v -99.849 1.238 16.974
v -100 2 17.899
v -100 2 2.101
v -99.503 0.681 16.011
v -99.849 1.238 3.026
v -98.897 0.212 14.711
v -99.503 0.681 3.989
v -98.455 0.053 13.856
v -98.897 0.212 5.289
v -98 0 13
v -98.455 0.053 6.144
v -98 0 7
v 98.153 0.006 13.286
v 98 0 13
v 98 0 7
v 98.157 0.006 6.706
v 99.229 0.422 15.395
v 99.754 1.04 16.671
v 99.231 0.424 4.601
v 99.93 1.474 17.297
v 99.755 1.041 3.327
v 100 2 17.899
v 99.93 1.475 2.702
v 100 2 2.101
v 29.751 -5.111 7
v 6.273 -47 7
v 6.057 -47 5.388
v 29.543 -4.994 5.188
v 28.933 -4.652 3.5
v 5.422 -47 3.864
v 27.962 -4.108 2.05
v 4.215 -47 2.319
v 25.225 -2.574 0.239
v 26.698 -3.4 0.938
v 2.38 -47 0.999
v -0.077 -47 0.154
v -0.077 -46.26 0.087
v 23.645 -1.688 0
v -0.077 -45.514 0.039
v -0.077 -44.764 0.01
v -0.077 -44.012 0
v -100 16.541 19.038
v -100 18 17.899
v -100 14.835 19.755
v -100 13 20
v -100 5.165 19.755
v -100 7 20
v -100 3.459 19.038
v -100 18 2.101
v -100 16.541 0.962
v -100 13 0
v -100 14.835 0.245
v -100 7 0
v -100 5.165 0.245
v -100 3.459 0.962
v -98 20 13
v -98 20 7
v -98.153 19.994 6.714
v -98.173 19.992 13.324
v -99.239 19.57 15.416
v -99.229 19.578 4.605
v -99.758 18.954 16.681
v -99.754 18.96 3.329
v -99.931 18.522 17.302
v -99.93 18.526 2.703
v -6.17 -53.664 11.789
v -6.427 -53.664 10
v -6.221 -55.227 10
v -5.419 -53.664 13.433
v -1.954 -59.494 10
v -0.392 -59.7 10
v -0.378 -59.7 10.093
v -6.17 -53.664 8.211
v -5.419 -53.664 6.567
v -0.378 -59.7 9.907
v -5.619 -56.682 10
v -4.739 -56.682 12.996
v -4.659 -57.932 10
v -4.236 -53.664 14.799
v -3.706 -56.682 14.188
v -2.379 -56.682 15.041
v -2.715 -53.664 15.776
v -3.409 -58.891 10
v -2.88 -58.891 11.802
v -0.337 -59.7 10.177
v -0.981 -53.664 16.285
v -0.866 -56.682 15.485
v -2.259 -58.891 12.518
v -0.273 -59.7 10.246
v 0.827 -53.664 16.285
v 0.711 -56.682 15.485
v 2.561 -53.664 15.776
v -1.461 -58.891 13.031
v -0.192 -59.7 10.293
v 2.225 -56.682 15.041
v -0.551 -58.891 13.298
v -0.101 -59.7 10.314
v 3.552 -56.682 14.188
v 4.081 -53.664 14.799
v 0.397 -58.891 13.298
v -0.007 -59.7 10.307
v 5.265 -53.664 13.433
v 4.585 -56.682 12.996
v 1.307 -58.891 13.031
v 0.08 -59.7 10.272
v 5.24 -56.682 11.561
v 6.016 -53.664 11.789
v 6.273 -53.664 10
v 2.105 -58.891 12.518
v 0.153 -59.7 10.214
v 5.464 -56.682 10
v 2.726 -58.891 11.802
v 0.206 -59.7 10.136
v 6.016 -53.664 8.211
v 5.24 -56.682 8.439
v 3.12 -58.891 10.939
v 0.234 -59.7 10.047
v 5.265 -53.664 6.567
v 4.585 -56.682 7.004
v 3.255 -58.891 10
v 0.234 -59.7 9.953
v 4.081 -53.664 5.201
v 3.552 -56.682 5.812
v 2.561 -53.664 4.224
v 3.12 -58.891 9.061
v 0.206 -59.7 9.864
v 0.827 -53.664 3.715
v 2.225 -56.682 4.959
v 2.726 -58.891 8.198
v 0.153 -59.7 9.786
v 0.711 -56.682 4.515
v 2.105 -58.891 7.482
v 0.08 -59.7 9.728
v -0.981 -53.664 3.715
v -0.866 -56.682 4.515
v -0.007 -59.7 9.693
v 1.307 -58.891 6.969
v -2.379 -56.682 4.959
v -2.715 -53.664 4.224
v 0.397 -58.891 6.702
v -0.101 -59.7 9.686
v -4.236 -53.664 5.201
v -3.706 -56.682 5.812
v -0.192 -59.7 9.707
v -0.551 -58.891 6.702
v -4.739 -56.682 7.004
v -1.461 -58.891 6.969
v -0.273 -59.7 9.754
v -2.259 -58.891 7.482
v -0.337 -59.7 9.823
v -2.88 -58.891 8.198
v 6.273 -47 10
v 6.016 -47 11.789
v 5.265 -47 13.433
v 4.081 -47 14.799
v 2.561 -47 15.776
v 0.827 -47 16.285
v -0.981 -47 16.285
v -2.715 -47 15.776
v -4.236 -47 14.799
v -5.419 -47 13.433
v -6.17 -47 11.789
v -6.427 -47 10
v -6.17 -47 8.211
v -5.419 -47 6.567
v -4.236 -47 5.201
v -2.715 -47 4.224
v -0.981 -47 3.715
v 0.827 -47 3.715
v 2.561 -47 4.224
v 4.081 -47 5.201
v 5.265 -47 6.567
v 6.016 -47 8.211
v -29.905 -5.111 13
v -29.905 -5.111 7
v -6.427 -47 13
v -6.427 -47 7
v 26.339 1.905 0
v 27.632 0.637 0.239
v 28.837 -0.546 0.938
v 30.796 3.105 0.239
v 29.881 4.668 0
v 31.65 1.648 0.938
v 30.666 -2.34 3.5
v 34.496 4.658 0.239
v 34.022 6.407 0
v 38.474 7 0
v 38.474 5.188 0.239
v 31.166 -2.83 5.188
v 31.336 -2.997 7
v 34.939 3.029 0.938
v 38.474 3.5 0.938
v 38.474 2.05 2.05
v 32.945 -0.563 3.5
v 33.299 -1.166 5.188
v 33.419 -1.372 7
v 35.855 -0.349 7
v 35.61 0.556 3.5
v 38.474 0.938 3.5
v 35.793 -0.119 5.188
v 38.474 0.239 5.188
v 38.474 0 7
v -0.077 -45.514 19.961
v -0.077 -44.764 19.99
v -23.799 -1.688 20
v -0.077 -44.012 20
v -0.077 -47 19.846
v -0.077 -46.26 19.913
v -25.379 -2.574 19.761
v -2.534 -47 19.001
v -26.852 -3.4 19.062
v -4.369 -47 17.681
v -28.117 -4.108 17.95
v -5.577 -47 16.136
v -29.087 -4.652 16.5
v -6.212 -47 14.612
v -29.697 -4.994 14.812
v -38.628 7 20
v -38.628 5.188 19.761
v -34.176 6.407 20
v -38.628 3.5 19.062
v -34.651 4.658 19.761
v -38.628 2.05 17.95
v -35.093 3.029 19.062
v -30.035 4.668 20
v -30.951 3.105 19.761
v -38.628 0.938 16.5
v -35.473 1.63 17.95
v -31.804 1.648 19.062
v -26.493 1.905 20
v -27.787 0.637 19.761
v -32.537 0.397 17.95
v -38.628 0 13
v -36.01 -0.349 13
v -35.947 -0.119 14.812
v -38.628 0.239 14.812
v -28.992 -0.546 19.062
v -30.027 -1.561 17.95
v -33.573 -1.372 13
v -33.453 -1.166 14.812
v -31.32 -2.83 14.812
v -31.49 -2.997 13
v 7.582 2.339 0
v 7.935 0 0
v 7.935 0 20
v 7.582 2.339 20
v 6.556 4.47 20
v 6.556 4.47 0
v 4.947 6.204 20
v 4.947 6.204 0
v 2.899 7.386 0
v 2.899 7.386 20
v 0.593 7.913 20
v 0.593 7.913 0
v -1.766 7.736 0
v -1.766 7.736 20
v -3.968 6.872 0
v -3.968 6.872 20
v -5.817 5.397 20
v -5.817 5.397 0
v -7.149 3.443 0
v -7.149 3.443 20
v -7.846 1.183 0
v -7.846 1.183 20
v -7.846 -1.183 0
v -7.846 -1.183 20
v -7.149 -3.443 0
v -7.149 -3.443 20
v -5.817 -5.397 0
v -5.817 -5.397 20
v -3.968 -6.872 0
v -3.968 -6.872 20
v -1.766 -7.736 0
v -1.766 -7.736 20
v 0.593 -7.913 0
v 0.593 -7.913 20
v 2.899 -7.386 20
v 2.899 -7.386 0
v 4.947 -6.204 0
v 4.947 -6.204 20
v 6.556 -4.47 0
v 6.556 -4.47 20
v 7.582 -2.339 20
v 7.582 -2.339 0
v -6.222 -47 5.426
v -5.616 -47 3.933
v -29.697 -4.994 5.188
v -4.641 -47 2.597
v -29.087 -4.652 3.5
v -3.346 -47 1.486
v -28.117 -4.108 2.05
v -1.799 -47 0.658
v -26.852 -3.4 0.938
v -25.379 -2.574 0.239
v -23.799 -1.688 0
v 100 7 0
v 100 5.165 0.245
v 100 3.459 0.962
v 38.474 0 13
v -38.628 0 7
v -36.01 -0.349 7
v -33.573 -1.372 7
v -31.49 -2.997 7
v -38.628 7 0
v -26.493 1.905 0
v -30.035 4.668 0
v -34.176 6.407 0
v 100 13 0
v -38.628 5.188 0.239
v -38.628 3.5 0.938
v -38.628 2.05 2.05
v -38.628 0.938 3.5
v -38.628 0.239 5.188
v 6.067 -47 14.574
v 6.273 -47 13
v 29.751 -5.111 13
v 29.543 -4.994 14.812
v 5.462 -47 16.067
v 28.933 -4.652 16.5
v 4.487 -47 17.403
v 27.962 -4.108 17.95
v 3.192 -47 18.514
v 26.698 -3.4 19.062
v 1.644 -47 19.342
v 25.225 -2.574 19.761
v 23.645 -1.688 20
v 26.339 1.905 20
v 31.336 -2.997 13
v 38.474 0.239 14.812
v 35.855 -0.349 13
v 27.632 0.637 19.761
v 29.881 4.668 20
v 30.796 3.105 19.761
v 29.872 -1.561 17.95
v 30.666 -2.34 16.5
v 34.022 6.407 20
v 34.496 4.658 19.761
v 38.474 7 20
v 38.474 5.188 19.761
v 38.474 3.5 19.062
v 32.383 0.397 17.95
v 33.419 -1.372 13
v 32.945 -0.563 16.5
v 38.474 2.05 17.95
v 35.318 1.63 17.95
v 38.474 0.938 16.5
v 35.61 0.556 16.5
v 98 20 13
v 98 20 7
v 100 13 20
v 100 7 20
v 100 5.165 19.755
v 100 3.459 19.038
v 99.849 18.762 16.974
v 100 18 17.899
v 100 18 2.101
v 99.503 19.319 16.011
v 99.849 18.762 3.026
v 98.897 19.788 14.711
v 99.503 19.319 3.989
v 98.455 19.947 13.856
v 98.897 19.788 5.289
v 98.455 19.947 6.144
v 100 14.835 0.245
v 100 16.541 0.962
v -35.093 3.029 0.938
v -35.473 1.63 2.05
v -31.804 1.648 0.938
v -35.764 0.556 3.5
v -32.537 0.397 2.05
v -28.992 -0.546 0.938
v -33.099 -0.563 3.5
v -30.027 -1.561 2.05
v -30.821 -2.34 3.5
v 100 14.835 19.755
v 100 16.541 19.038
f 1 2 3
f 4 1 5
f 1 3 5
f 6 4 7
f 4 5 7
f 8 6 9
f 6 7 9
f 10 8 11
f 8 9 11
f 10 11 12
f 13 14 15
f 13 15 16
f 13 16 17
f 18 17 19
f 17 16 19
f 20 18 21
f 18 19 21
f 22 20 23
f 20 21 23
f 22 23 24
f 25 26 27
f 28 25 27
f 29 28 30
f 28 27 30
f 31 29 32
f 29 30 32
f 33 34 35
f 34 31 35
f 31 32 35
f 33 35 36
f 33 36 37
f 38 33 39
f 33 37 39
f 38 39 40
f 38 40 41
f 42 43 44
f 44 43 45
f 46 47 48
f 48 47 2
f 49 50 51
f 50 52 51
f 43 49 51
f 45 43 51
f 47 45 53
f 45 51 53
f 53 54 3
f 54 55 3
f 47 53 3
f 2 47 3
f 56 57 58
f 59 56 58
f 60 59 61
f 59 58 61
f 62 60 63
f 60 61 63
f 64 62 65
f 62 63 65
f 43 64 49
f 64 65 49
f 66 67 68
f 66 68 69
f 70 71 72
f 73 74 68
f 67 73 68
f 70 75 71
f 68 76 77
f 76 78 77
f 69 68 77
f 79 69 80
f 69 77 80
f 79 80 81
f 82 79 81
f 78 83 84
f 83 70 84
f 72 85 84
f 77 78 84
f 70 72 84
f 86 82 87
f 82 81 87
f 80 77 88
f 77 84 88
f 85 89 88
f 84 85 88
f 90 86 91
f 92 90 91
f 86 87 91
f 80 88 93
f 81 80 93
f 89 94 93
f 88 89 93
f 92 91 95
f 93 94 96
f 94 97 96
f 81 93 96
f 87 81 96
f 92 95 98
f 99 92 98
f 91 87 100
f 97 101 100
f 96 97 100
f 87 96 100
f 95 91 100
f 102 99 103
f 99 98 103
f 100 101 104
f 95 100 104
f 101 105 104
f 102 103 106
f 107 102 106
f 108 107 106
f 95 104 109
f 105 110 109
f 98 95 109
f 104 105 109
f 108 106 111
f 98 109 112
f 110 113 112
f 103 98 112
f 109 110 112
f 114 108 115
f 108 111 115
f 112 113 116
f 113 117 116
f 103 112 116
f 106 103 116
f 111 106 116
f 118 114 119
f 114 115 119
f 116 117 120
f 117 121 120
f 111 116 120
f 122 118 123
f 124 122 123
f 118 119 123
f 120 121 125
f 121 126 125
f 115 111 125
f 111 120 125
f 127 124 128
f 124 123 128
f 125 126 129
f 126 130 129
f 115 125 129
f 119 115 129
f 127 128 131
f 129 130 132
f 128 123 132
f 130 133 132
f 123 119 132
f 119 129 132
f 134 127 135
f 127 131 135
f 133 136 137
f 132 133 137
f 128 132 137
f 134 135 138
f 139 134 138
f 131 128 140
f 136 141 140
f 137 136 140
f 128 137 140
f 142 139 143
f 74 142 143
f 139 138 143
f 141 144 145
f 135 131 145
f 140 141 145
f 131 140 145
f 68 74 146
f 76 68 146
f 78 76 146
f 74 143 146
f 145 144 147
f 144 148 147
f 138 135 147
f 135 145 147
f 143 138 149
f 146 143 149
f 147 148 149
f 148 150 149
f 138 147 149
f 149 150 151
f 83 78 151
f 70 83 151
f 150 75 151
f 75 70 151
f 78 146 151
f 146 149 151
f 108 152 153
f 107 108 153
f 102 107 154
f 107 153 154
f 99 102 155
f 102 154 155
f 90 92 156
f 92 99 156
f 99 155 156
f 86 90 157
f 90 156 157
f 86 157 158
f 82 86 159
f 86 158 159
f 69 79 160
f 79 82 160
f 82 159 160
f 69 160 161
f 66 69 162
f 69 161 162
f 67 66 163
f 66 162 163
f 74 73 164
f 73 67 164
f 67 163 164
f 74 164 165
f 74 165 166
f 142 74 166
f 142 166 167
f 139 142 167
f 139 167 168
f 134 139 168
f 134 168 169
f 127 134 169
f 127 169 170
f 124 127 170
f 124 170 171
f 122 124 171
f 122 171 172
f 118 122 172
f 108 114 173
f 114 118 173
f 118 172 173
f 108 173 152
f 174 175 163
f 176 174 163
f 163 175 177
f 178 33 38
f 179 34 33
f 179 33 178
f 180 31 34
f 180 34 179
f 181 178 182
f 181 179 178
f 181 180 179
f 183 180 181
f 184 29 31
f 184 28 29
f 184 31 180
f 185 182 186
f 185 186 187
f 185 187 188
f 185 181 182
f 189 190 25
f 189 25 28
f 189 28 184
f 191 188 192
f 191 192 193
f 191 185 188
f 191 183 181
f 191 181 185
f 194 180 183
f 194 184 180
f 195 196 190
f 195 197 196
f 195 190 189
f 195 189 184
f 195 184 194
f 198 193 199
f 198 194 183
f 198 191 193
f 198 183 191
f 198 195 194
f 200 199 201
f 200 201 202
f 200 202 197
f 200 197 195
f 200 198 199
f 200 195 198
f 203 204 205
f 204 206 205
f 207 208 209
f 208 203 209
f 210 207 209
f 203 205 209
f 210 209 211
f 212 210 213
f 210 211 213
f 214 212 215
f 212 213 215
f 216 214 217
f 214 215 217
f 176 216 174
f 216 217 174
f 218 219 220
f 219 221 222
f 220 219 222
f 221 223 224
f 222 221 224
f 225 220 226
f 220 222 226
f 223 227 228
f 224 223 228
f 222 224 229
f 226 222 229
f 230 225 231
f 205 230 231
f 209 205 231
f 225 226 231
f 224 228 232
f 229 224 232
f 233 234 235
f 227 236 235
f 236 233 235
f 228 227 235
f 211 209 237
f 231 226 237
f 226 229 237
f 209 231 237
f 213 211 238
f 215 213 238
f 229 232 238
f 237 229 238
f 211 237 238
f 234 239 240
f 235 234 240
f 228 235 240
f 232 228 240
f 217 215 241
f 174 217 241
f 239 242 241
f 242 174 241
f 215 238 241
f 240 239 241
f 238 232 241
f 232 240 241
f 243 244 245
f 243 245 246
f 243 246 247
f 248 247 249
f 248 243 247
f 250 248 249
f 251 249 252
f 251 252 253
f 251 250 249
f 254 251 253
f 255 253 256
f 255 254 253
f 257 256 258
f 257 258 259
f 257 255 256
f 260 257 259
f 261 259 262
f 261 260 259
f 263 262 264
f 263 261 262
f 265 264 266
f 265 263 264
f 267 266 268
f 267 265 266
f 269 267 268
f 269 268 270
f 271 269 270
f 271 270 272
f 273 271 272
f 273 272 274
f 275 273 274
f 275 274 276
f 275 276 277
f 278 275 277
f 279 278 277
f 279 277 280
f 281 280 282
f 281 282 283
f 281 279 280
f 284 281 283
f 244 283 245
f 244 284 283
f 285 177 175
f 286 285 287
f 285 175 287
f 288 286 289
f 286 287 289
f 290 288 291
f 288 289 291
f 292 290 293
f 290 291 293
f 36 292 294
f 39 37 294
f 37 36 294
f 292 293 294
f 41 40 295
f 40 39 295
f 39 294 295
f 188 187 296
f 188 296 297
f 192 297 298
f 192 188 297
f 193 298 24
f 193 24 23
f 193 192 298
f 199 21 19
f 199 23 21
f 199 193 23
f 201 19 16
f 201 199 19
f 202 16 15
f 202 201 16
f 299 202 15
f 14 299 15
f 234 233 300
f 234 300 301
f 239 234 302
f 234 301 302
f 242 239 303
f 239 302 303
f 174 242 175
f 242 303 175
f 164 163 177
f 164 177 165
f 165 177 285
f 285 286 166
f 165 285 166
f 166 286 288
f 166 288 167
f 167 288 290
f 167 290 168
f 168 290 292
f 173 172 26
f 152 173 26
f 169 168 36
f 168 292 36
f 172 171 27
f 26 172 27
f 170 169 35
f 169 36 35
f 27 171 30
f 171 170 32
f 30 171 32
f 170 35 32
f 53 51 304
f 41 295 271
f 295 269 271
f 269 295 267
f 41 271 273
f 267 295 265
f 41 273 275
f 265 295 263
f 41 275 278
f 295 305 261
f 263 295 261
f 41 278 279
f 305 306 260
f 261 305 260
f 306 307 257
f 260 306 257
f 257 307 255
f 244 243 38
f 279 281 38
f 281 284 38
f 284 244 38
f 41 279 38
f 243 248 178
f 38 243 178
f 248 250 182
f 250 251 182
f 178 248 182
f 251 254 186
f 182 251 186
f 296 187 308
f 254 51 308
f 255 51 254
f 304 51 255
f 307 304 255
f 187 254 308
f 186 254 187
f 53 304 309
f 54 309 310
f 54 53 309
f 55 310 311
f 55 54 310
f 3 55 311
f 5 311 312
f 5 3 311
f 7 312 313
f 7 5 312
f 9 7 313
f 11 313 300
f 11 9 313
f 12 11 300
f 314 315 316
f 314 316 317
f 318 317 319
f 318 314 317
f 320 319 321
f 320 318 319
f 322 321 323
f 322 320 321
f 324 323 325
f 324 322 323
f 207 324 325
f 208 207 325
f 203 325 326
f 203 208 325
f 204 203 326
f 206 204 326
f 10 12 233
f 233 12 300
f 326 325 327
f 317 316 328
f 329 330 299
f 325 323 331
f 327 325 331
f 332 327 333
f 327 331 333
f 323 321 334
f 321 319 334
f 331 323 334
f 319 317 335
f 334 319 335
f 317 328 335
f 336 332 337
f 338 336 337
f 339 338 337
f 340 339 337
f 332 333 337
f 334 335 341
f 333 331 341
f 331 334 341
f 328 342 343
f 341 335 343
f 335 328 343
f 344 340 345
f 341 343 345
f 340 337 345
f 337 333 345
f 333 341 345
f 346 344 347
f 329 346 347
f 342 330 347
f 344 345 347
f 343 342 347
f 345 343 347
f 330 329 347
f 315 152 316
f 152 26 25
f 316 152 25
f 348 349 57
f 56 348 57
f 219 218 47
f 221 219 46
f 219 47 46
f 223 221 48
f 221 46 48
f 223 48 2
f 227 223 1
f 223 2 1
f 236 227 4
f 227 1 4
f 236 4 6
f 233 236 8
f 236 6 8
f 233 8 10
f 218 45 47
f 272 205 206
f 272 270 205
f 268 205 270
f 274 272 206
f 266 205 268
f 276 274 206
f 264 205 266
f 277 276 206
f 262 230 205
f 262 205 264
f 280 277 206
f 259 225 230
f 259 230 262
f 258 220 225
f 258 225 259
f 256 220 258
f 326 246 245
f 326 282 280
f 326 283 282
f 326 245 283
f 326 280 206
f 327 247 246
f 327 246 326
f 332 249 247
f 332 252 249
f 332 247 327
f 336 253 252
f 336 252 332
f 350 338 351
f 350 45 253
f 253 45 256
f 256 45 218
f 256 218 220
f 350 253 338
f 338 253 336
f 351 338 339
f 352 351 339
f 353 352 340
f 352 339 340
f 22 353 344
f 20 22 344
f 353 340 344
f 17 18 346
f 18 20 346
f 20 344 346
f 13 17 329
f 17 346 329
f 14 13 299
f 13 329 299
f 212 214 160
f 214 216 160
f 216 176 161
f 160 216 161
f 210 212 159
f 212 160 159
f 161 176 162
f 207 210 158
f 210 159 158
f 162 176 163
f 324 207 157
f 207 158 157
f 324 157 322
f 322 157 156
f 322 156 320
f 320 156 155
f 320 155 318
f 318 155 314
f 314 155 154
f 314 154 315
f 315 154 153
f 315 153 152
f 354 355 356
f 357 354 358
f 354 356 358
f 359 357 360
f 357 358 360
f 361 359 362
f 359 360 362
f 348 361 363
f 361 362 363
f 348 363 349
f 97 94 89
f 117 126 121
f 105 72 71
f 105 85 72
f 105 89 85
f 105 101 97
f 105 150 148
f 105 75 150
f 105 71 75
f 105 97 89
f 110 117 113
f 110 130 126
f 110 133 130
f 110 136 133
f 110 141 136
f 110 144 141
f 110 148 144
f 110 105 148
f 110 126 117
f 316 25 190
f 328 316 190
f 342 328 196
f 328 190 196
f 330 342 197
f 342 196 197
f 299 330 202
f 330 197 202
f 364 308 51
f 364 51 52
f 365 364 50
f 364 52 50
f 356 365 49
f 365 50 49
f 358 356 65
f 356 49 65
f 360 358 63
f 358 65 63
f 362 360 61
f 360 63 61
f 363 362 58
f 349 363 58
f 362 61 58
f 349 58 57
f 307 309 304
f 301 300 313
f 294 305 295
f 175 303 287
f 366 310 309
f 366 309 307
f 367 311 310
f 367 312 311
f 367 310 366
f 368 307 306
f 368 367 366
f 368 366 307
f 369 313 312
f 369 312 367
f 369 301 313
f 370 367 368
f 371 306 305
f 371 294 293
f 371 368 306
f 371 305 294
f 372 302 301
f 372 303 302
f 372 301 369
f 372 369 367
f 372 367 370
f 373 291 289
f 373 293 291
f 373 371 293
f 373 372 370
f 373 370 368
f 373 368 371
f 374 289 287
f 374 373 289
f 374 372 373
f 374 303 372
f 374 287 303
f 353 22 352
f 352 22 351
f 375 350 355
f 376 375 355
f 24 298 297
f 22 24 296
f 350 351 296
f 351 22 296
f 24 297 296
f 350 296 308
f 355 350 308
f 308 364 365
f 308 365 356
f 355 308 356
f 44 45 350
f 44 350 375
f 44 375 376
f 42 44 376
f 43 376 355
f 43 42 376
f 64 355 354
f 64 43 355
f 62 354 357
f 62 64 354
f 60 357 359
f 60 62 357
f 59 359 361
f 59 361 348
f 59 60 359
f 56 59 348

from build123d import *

# Parameters (mm, degrees)
F0_R         = 7.935
F1_DEPTH     = 20
F2_DEPTH     = 12.7
F4_DEPTH     = 12.7
F6_T1_DEPTH  = 77.0257979591
F6_T3_DEPTH  = 76.8715237662
F6_T5_DEPTH  = 231
F6_T8_ANGLE  = 60.7302478015
F6_T12_DEPTH = 65.5200608313
F6_T17_DEPTH = 65.5200608313
F6_T20_ANGLE = 60.7302478015
F6_T22_ANGLE = 60.7302478015
F6_T26_DEPTH = 65.5200608313
F6_T31_DEPTH = 65.5200608313
F6_T34_ANGLE = 60.7302478015


# Not quite as in the source:
# - a fillet or chamfer that OpenCascade refuses, or shapes differently, is made with other operations: its cross-section is extruded or revolved along the edge and cut away or added


with BuildPart() as f1:
    # F0 (on Top) → F1 (new body)
    with BuildSketch(Plane.XY):
        with BuildLine():
            Line((98, 20), (-98, 20))
            ThreePointArc((-98, 20), (-99.4142135624, 19.4142135624), (-100, 18))
            Line((-100, 18), (-100, 2))
            ThreePointArc((-100, 2), (-99.4142135624, 0.5857864376), (-98, 0))
            Line((-98, 0), (-38.6284762338, 0))
            ThreePointArc((-38.6284762338, 0), (-33.5733896743, -1.3717846645), (-29.9052011587, -5.1107800249))
            Line((-29.9052011587, -5.1107800249), (-6.4271370964, -47))
            Line((-6.4271370964, -47), (-6.4271370964, -59.7))
            Line((-6.4271370964, -59.7), (6.2728629036, -59.7))
            Line((6.2728629036, -59.7), (6.2728629036, -47))
            Line((6.2728629036, -47), (29.7509269659, -5.1107800249))
            ThreePointArc((29.7509269659, -5.1107800249), (33.4191154814, -1.3717846645), (38.4742020409, 0))
            Line((38.4742020409, 0), (98, 0))
            ThreePointArc((98, 0), (99.4142135624, 0.5857864376), (100, 2))
            Line((100, 2), (100, 18))
            ThreePointArc((100, 18), (99.4142135624, 19.4142135624), (98, 20))
        make_face()
        Circle(F0_R, mode=Mode.SUBTRACT)
    extrude(amount=F1_DEPTH)

    # F2 (cut): a face of the model
    f2_faces = [f1.faces().sort_by_distance(p)[0] for p in [
        (-0.0771370964, -59.7, 10),
    ]]
    extrude(f2_faces, amount=-F2_DEPTH, mode=Mode.SUBTRACT)

    # F3 (on face) → F4 (join)
    with BuildSketch(Plane.XZ.offset(47)):
        with BuildLine():
            ThreePointArc((-6.4271370964, 10), (-0.0771370964, 3.65), (6.2728629036, 10))
            ThreePointArc((6.2728629036, 10), (-0.0771370964, 16.35), (-6.4271370964, 10))
        make_face()
    extrude(amount=F4_DEPTH)

    # F5: fillet of radius 6.0355339059 on 1 edges, made by hand

    # F5_s1 → F5_t2 (revolve, cut)
    with BuildSketch(Plane.XY.offset(10)):
        with BuildLine():
            ThreePointArc((-6.4271370964, -53.6644660941), (-4.6593701435, -57.932233047), (-0.3916031905, -59.7))
            Line((-0.3916031905, -59.7), (-6.4271370964, -59.7))
            Line((-6.4271370964, -59.7), (-6.4271370964, -53.6644660941))
        make_face()
    revolve(axis=Axis((-0.0771370964, -59.7, 10), (0, 1, 0)), mode=Mode.SUBTRACT)

    # F6: fillet of radius 7 on 14 edges, made by hand

    # F6_s2 → F6_t1 (cut)
    with BuildSketch(Plane.YZ.offset(38.4742020409)):
        with BuildLine():
            ThreePointArc((7, 0), (2.0502525317, 2.0502525317), (0, 7))
            Line((0, 7), (0, 0))
            Line((0, 0), (7, 0))
        make_face()
        with BuildLine():
            ThreePointArc((7, 20), (2.0502525317, 17.9497474683), (0, 13))
            Line((0, 13), (0, 20))
            Line((0, 20), (7, 20))
        make_face()
    extrude(amount=F6_T1_DEPTH, mode=Mode.SUBTRACT)

    # F6_s4 → F6_t3 (cut)
    with BuildSketch(Plane.YZ.offset(-115.5)):
        with BuildLine():
            ThreePointArc((7, 0), (2.0502525317, 2.0502525317), (0, 7))
            Line((0, 7), (0, 0))
            Line((0, 0), (7, 0))
        make_face()
        with BuildLine():
            ThreePointArc((7, 20), (2.0502525317, 17.9497474683), (0, 13))
            Line((0, 13), (0, 20))
            Line((0, 20), (7, 20))
        make_face()
    extrude(amount=F6_T3_DEPTH, mode=Mode.SUBTRACT)

    # F6_s6 → F6_t5 (cut)
    with BuildSketch(Plane.YZ.offset(-115.5)):
        with BuildLine():
            ThreePointArc((13, 0), (17.9497474683, 2.0502525317), (20, 7))
            Line((20, 7), (20, 0))
            Line((20, 0), (13, 0))
        make_face()
        with BuildLine():
            ThreePointArc((13, 20), (17.9497474683, 17.9497474683), (20, 13))
            Line((20, 13), (20, 20))
            Line((20, 20), (13, 20))
        make_face()
    extrude(amount=F6_T5_DEPTH, mode=Mode.SUBTRACT)

    # F6_s7 → F6_t8 (revolve, cut)
    with BuildSketch(Plane(origin=(4.9320537662, 8.7996985012, 0), x_dir=(0, 0, 1), z_dir=(-0.4889219975, -0.8723275075, 0))):
        with BuildLine():
            ThreePointArc((0, -21.4513247447), (2.0502525317, -26.401072213), (7, -28.4513247447))
            Line((7, -28.4513247447), (0, -28.4513247447))
            Line((0, -28.4513247447), (0, -21.4513247447))
        make_face()
    revolve(axis=Axis((38.4742020409, -10, 0), (0, 0, -1)), revolution_arc=F6_T8_ANGLE, mode=Mode.SUBTRACT)


with BuildPart() as f6_tool10:
    # F6_s11 → F6_t12 (new body)
    with BuildSketch(Plane(origin=(-27.1021452526, -48.3552528553, 0), x_dir=(0, 0, 1), z_dir=(0.4889219975, 0.8723275075, 0))):
        with BuildLine():
            ThreePointArc((7, 28.4513247447), (2.0502525317, 26.401072213), (0, 21.4513247447))
            Line((0, 21.4513247447), (0, 28.4513247447))
            Line((0, 28.4513247447), (7, 28.4513247447))
        make_face()
    extrude(amount=F6_T12_DEPTH)

    split(bisect_by=Plane.XZ.offset(47), keep=Keep.BOTTOM)


with BuildPart() as f1_1:
    add(f1.part)

    # F6_t9: cut F6_tool10
    add(f6_tool10.part, mode=Mode.SUBTRACT)


with BuildPart() as f6_tool15:
    # F6_s16 → F6_t17 (new body)
    with BuildSketch(Plane(origin=(-4.9689321973, 8.865496461, 0), x_dir=(0, 0, 1), z_dir=(0.4889219975, -0.8723275075, 0))):
        with BuildLine():
            ThreePointArc((7, 28.5859023668), (2.0502525317, 26.5356498351), (0, 21.5859023668))
            Line((0, 21.5859023668), (0, 28.5859023668))
            Line((0, 28.5859023668), (7, 28.5859023668))
        make_face()
    extrude(amount=F6_T17_DEPTH)

    split(bisect_by=Plane.XZ.offset(47), keep=Keep.BOTTOM)


with BuildPart() as f1_2:
    add(f1_1.part)

    # F6_t14: cut F6_tool15
    add(f6_tool15.part, mode=Mode.SUBTRACT)

    # F6_s19 → F6_t20 (revolve, cut)
    with BuildSketch(Plane.YZ.offset(-38.6284762338)):
        with BuildLine():
            ThreePointArc((7, 0), (2.0502525317, 2.0502525317), (0, 7))
            Line((0, 7), (0, 0))
            Line((0, 0), (7, 0))
        make_face()
    revolve(axis=Axis((-38.6284762338, -10, 0), (0, 0, -1)), revolution_arc=F6_T20_ANGLE, mode=Mode.SUBTRACT)

    # F6_s21 → F6_t22 (revolve, cut)
    with BuildSketch(Plane(origin=(4.9320537662, 8.7996985012, 0), x_dir=(0, 0, 1), z_dir=(-0.4889219975, -0.8723275075, 0))):
        with BuildLine():
            ThreePointArc((20, -21.4513247447), (17.9497474683, -26.401072213), (13, -28.4513247447))
            Line((13, -28.4513247447), (20, -28.4513247447))
            Line((20, -28.4513247447), (20, -21.4513247447))
        make_face()
    revolve(axis=Axis((38.4742020409, -10, 20), (0, 0, -1)), revolution_arc=F6_T22_ANGLE, mode=Mode.SUBTRACT)


with BuildPart() as f6_tool24:
    # F6_s25 → F6_t26 (new body)
    with BuildSketch(Plane(origin=(-27.1021452526, -48.3552528553, 0), x_dir=(0, 0, 1), z_dir=(0.4889219975, 0.8723275075, 0))):
        with BuildLine():
            ThreePointArc((13, 28.4513247447), (17.9497474683, 26.401072213), (20, 21.4513247447))
            Line((20, 21.4513247447), (20, 28.4513247447))
            Line((20, 28.4513247447), (13, 28.4513247447))
        make_face()
    extrude(amount=F6_T26_DEPTH)

    split(bisect_by=Plane.XZ.offset(47), keep=Keep.BOTTOM)


with BuildPart() as f1_3:
    add(f1_2.part)

    # F6_t23: cut F6_tool24
    add(f6_tool24.part, mode=Mode.SUBTRACT)


with BuildPart() as f6_tool29:
    # F6_s30 → F6_t31 (new body)
    with BuildSketch(Plane(origin=(-4.9689321973, 8.865496461, 0), x_dir=(0, 0, 1), z_dir=(0.4889219975, -0.8723275075, 0))):
        with BuildLine():
            ThreePointArc((20, 21.5859023668), (17.9497474683, 26.5356498351), (13, 28.5859023668))
            Line((13, 28.5859023668), (20, 28.5859023668))
            Line((20, 28.5859023668), (20, 21.5859023668))
        make_face()
    extrude(amount=F6_T31_DEPTH)

    split(bisect_by=Plane.XZ.offset(47), keep=Keep.BOTTOM)


with BuildPart() as f1_4:
    add(f1_3.part)

    # F6_t28: cut F6_tool29
    add(f6_tool29.part, mode=Mode.SUBTRACT)

    # F6_s33 → F6_t34 (revolve, cut)
    with BuildSketch(Plane.YZ.offset(-38.6284762338)):
        with BuildLine():
            ThreePointArc((7, 20), (2.0502525317, 17.9497474683), (0, 13))
            Line((0, 13), (0, 20))
            Line((0, 20), (7, 20))
        make_face()
    revolve(axis=Axis((-38.6284762338, -10, 20), (0, 0, -1)), revolution_arc=F6_T34_ANGLE, mode=Mode.SUBTRACT)


solid = f1_4.part
